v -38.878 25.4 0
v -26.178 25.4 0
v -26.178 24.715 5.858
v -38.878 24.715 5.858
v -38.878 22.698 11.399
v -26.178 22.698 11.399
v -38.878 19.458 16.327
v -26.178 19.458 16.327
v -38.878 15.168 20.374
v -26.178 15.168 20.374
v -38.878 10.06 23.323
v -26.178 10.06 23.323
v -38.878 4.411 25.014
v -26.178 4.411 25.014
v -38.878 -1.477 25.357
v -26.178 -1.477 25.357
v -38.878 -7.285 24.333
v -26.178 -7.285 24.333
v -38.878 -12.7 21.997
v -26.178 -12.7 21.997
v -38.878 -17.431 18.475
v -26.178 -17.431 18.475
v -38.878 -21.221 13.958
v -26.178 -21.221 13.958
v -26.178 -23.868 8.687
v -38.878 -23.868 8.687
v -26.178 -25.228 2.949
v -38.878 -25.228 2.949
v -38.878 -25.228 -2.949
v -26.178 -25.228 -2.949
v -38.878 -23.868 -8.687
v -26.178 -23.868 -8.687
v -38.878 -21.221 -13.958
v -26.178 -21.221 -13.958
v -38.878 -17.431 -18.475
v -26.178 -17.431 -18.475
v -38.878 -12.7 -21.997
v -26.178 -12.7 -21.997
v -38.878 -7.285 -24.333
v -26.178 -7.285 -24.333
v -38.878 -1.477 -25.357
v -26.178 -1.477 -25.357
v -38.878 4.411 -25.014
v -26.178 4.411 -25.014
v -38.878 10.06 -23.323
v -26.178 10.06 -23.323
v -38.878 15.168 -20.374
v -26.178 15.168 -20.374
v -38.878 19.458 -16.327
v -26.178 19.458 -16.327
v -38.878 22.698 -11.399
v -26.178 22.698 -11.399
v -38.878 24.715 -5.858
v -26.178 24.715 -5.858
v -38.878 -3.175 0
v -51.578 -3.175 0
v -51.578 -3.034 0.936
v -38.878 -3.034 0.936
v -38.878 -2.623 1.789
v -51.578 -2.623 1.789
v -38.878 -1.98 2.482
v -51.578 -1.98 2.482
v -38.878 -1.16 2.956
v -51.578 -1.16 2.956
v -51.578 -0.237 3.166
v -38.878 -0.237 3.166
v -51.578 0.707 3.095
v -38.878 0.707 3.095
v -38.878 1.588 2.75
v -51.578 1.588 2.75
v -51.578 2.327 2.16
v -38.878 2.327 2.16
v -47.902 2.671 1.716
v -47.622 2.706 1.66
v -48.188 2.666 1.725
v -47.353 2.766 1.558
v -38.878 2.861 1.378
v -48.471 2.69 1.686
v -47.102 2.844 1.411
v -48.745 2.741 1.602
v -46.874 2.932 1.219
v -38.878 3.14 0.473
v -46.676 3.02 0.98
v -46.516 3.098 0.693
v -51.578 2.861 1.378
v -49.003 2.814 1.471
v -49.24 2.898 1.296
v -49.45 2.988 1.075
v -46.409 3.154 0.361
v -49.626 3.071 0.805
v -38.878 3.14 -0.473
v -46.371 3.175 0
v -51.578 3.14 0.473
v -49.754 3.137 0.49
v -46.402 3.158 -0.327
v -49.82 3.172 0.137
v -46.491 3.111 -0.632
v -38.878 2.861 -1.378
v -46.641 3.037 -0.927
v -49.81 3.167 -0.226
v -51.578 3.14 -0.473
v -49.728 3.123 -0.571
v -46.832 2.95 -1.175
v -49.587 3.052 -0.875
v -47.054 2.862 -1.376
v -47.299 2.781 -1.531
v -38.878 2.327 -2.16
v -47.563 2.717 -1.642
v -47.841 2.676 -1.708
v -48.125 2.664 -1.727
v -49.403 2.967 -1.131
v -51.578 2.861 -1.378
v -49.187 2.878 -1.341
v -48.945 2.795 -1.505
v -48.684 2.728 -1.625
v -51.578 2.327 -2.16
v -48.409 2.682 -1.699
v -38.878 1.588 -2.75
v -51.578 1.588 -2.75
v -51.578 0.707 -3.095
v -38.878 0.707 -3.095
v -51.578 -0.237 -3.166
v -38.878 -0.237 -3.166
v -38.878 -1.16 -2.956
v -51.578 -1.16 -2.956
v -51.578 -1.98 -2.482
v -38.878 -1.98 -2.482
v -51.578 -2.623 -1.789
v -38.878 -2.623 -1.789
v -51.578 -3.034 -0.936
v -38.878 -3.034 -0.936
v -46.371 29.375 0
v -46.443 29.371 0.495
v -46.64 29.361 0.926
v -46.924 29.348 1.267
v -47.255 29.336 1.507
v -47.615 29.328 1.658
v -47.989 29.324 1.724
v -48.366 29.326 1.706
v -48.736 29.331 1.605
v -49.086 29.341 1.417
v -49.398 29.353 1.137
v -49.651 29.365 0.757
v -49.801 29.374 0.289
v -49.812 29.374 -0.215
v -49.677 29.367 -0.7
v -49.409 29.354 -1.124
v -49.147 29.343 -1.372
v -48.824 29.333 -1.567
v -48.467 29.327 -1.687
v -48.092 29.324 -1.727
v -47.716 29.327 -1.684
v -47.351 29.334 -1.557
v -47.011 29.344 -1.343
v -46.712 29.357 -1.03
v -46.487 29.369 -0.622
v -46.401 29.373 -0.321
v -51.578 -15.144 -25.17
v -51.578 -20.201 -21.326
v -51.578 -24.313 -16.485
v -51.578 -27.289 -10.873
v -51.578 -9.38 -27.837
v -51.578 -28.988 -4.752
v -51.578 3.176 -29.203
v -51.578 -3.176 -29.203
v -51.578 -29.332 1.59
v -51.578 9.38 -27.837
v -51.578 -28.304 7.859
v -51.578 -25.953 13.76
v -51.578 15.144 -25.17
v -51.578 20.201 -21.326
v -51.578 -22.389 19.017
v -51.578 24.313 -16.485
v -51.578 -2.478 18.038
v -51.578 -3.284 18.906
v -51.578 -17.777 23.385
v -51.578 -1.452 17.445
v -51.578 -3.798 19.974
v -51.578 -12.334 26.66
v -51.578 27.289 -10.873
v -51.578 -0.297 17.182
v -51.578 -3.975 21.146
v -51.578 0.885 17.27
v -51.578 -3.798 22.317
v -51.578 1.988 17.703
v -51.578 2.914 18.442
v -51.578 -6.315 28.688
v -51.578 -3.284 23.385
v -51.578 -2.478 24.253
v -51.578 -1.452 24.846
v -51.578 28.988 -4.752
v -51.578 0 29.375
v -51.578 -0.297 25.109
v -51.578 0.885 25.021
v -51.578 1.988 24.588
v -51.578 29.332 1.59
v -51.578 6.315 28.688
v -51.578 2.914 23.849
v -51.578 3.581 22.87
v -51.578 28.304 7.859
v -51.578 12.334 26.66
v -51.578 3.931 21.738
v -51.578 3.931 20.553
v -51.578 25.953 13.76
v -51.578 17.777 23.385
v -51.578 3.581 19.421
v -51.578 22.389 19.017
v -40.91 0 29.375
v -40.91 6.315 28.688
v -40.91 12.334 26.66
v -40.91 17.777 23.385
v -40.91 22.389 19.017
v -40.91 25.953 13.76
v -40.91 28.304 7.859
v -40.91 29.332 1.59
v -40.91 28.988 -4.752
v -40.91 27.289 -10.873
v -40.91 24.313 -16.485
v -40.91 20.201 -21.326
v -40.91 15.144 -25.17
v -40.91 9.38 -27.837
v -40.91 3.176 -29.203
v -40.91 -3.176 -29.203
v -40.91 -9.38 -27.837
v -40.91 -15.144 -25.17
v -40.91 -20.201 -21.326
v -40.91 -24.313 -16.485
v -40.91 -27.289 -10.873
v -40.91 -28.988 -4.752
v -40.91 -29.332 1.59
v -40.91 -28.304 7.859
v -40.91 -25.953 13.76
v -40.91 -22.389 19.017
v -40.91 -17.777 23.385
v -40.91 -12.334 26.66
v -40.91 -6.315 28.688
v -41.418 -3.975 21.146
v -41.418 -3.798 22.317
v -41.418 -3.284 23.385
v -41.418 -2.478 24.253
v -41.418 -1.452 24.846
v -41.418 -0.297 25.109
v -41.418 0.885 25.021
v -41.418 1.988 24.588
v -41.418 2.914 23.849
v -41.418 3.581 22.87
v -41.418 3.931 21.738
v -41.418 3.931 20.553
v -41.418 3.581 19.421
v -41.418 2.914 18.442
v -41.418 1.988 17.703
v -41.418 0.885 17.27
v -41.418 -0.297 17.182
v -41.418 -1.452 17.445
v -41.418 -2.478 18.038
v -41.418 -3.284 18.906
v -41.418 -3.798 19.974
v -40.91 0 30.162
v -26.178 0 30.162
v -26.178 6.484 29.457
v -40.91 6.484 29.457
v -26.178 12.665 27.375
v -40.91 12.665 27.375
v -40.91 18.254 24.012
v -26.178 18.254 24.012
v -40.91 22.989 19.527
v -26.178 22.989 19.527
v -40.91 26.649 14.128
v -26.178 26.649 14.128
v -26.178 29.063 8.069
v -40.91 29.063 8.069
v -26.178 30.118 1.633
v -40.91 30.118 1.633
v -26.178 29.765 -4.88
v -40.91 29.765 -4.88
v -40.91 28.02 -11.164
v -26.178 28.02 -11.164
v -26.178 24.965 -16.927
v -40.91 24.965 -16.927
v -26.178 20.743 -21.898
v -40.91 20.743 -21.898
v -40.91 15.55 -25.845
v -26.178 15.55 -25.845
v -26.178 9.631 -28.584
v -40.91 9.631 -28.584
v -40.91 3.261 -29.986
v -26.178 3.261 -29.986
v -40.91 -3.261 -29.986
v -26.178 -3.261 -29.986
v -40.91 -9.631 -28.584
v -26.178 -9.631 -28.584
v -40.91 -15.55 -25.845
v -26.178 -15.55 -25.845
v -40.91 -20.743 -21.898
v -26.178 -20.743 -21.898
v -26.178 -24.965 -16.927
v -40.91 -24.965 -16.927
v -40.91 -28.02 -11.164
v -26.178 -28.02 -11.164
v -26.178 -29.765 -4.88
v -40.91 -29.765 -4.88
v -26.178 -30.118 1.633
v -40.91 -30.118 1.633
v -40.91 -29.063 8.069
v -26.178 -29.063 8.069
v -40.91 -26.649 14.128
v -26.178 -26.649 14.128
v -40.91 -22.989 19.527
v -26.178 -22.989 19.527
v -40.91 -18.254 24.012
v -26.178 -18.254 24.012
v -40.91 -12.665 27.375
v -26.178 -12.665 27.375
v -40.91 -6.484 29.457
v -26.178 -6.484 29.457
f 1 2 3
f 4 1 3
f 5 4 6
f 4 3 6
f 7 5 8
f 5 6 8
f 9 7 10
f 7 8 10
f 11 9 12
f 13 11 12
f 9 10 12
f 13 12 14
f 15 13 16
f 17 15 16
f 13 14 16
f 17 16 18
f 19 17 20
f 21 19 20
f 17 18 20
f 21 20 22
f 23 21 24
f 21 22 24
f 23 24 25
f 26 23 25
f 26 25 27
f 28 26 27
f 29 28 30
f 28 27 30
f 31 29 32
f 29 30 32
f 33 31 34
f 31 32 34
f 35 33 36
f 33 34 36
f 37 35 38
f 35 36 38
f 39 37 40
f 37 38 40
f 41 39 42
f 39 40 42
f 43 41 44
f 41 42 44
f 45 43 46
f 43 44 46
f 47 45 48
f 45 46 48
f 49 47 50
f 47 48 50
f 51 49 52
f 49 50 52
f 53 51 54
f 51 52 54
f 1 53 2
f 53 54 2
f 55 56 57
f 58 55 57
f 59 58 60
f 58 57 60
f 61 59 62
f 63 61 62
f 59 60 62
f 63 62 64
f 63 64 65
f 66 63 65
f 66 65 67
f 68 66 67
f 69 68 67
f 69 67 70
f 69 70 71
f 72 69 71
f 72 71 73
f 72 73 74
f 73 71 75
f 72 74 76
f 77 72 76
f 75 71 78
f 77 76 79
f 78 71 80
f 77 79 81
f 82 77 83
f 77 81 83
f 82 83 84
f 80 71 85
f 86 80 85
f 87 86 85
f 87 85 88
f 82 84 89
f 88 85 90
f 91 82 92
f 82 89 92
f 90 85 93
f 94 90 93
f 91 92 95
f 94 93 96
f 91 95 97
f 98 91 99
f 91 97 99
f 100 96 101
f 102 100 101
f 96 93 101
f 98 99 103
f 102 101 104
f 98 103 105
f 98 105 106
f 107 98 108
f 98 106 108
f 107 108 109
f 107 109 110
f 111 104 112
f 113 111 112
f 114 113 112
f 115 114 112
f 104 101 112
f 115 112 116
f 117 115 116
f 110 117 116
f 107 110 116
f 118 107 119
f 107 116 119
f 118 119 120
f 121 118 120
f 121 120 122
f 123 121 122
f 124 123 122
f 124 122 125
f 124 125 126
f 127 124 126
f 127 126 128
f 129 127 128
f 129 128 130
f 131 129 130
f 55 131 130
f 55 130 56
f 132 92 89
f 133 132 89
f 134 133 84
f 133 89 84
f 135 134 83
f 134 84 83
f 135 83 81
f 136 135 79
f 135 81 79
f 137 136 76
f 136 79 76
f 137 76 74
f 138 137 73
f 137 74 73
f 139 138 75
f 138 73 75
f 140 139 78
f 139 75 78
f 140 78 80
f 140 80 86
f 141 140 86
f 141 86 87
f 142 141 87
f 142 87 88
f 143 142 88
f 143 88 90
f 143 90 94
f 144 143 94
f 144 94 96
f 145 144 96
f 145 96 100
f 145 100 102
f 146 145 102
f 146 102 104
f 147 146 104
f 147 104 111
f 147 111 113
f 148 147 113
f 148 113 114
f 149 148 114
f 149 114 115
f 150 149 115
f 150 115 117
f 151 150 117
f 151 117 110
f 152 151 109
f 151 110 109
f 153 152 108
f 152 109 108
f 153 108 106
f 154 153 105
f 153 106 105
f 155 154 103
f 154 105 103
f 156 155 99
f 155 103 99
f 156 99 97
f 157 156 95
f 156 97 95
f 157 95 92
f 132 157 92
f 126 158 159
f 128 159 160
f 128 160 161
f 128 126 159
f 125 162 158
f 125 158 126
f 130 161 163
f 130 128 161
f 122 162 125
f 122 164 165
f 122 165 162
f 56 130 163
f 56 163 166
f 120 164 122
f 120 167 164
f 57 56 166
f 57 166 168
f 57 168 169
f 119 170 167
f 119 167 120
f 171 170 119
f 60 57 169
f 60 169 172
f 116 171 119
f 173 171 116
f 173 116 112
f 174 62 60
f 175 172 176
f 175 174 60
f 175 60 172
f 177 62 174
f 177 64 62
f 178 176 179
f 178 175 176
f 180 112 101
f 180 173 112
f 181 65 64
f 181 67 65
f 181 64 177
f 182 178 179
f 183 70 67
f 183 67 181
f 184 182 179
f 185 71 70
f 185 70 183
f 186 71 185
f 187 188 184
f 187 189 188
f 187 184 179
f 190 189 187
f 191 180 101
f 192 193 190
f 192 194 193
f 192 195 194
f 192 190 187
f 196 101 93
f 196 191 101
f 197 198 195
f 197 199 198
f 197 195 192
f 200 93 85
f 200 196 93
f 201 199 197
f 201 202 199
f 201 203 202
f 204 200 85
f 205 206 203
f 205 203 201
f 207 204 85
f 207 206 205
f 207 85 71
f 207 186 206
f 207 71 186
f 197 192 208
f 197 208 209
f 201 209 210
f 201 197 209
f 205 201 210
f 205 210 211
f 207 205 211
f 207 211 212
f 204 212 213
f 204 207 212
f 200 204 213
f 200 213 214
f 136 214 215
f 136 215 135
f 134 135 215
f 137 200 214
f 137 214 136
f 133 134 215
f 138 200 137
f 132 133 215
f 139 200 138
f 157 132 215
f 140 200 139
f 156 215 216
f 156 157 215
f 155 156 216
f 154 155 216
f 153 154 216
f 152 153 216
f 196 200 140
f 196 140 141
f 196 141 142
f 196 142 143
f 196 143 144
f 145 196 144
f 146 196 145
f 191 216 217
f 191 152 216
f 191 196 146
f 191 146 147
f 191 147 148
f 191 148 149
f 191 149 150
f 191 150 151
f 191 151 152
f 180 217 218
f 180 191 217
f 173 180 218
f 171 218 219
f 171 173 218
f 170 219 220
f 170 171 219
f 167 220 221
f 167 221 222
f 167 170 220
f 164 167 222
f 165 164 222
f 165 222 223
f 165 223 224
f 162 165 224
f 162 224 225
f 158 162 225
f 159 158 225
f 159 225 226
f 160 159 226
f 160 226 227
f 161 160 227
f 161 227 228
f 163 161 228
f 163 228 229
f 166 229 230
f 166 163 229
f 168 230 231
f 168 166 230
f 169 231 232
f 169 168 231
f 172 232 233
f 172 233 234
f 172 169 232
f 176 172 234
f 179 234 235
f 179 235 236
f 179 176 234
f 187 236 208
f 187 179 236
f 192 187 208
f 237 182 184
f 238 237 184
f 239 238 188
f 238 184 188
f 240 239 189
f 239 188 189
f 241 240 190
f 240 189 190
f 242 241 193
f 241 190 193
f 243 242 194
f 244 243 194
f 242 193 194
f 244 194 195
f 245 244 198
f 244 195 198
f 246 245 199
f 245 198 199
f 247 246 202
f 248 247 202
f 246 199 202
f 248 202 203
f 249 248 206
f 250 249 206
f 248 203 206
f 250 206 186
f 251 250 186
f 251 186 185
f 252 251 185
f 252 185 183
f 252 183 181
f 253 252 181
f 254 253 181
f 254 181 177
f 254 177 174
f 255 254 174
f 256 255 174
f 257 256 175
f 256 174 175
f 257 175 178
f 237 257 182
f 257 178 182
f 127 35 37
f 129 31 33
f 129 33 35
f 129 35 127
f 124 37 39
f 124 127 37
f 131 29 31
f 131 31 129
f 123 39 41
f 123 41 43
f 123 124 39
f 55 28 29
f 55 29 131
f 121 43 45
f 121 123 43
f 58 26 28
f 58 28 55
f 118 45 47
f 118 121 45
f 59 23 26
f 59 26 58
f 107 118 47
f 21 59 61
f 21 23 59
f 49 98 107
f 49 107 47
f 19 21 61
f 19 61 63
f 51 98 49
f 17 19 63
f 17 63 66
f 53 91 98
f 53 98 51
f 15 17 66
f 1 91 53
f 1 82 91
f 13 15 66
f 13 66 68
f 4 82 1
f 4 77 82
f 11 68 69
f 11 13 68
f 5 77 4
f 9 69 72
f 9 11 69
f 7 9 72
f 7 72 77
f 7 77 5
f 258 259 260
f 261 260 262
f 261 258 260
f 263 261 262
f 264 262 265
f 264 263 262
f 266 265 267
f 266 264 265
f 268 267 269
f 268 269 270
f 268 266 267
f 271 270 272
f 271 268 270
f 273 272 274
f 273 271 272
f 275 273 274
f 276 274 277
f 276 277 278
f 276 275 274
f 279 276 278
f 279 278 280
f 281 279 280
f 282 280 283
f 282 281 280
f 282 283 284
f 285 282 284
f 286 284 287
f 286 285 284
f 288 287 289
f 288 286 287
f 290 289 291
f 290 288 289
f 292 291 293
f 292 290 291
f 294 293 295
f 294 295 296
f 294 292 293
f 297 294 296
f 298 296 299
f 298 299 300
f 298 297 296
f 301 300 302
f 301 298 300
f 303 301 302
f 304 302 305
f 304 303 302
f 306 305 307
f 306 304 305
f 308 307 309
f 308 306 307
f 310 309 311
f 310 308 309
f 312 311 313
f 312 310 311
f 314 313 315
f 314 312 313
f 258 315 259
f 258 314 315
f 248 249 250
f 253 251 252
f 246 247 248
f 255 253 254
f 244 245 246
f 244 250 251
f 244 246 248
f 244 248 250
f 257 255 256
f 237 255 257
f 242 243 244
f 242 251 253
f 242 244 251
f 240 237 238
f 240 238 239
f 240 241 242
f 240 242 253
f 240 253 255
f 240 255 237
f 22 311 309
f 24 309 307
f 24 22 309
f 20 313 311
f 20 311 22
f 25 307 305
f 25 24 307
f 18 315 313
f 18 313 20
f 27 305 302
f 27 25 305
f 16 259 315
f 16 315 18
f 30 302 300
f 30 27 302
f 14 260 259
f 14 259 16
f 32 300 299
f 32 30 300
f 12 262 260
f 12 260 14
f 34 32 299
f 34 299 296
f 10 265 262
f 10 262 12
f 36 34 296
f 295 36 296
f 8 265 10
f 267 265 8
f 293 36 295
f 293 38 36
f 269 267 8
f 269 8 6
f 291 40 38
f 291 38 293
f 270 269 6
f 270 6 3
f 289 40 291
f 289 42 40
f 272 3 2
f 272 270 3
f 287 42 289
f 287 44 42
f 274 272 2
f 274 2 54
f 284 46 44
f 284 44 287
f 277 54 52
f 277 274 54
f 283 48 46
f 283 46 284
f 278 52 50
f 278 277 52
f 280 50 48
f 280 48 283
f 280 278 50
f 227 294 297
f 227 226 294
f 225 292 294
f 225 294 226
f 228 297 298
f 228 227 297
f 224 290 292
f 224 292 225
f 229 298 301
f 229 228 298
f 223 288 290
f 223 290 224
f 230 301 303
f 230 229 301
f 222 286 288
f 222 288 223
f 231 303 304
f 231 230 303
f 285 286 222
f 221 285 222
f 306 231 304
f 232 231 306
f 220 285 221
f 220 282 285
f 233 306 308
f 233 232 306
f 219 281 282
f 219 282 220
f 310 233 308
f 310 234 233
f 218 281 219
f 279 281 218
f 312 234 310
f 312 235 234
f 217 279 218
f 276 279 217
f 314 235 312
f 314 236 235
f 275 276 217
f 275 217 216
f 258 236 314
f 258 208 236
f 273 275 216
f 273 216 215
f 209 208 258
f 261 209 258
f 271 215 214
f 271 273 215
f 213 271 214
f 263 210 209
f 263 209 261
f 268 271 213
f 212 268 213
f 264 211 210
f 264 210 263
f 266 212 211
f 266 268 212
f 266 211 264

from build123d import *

# Parameters (mm, degrees)
F2_R     = 25.4
F3_DEPTH = 12.7
F4_R     = 3.175
F5_DEPTH = 25.4
F6_R     = 3.9751
F7_DEPTH = 10.16
F8_R     = 1.7272
F9_DEPTH = 70.55837


with BuildPart() as f1:
    # F0 (on Front) → F1 (revolve)
    with BuildSketch(Plane.XZ):
        Polygon((-51.577873, 29.3751), (-51.577873, 0), (-26.177873, 0), (-26.177873, 30.1625), (-40.909873, 30.1625), (-40.909873, 29.3751), align=None)
    revolve(axis=Axis((-38.877873, 0, 0), (-1, 0, 0)))

    # F2 (on face) → F3 (cut)
    with BuildSketch(Plane.YZ.offset(-26.177873)):
        Circle(F2_R)
    extrude(amount=-F3_DEPTH, mode=Mode.SUBTRACT)

    # F4 (on face) → F5 (cut)
    with BuildSketch(Plane(origin=(-51.577873, 0, 0), x_dir=(0, -1, 0), z_dir=(-1, 0, 0))):
        Circle(F4_R)
    extrude(amount=-F5_DEPTH, mode=Mode.SUBTRACT)

    # F6 (on face) → F7 (cut)
    with BuildSketch(Plane(origin=(-51.577873, 0, 0), x_dir=(0, -1, 0), z_dir=(-1, 0, 0))):
        with Locations((0, 21.1455)):
            Circle(F6_R)
    extrude(amount=-F7_DEPTH, mode=Mode.SUBTRACT)

    # F8 (on Front) → F9 (cut)
    with BuildSketch(Plane.XZ):
        with Locations((-48.098073, 0)):
            Circle(F8_R)
    extrude(amount=-F9_DEPTH, mode=Mode.SUBTRACT)


solid = f1.part
